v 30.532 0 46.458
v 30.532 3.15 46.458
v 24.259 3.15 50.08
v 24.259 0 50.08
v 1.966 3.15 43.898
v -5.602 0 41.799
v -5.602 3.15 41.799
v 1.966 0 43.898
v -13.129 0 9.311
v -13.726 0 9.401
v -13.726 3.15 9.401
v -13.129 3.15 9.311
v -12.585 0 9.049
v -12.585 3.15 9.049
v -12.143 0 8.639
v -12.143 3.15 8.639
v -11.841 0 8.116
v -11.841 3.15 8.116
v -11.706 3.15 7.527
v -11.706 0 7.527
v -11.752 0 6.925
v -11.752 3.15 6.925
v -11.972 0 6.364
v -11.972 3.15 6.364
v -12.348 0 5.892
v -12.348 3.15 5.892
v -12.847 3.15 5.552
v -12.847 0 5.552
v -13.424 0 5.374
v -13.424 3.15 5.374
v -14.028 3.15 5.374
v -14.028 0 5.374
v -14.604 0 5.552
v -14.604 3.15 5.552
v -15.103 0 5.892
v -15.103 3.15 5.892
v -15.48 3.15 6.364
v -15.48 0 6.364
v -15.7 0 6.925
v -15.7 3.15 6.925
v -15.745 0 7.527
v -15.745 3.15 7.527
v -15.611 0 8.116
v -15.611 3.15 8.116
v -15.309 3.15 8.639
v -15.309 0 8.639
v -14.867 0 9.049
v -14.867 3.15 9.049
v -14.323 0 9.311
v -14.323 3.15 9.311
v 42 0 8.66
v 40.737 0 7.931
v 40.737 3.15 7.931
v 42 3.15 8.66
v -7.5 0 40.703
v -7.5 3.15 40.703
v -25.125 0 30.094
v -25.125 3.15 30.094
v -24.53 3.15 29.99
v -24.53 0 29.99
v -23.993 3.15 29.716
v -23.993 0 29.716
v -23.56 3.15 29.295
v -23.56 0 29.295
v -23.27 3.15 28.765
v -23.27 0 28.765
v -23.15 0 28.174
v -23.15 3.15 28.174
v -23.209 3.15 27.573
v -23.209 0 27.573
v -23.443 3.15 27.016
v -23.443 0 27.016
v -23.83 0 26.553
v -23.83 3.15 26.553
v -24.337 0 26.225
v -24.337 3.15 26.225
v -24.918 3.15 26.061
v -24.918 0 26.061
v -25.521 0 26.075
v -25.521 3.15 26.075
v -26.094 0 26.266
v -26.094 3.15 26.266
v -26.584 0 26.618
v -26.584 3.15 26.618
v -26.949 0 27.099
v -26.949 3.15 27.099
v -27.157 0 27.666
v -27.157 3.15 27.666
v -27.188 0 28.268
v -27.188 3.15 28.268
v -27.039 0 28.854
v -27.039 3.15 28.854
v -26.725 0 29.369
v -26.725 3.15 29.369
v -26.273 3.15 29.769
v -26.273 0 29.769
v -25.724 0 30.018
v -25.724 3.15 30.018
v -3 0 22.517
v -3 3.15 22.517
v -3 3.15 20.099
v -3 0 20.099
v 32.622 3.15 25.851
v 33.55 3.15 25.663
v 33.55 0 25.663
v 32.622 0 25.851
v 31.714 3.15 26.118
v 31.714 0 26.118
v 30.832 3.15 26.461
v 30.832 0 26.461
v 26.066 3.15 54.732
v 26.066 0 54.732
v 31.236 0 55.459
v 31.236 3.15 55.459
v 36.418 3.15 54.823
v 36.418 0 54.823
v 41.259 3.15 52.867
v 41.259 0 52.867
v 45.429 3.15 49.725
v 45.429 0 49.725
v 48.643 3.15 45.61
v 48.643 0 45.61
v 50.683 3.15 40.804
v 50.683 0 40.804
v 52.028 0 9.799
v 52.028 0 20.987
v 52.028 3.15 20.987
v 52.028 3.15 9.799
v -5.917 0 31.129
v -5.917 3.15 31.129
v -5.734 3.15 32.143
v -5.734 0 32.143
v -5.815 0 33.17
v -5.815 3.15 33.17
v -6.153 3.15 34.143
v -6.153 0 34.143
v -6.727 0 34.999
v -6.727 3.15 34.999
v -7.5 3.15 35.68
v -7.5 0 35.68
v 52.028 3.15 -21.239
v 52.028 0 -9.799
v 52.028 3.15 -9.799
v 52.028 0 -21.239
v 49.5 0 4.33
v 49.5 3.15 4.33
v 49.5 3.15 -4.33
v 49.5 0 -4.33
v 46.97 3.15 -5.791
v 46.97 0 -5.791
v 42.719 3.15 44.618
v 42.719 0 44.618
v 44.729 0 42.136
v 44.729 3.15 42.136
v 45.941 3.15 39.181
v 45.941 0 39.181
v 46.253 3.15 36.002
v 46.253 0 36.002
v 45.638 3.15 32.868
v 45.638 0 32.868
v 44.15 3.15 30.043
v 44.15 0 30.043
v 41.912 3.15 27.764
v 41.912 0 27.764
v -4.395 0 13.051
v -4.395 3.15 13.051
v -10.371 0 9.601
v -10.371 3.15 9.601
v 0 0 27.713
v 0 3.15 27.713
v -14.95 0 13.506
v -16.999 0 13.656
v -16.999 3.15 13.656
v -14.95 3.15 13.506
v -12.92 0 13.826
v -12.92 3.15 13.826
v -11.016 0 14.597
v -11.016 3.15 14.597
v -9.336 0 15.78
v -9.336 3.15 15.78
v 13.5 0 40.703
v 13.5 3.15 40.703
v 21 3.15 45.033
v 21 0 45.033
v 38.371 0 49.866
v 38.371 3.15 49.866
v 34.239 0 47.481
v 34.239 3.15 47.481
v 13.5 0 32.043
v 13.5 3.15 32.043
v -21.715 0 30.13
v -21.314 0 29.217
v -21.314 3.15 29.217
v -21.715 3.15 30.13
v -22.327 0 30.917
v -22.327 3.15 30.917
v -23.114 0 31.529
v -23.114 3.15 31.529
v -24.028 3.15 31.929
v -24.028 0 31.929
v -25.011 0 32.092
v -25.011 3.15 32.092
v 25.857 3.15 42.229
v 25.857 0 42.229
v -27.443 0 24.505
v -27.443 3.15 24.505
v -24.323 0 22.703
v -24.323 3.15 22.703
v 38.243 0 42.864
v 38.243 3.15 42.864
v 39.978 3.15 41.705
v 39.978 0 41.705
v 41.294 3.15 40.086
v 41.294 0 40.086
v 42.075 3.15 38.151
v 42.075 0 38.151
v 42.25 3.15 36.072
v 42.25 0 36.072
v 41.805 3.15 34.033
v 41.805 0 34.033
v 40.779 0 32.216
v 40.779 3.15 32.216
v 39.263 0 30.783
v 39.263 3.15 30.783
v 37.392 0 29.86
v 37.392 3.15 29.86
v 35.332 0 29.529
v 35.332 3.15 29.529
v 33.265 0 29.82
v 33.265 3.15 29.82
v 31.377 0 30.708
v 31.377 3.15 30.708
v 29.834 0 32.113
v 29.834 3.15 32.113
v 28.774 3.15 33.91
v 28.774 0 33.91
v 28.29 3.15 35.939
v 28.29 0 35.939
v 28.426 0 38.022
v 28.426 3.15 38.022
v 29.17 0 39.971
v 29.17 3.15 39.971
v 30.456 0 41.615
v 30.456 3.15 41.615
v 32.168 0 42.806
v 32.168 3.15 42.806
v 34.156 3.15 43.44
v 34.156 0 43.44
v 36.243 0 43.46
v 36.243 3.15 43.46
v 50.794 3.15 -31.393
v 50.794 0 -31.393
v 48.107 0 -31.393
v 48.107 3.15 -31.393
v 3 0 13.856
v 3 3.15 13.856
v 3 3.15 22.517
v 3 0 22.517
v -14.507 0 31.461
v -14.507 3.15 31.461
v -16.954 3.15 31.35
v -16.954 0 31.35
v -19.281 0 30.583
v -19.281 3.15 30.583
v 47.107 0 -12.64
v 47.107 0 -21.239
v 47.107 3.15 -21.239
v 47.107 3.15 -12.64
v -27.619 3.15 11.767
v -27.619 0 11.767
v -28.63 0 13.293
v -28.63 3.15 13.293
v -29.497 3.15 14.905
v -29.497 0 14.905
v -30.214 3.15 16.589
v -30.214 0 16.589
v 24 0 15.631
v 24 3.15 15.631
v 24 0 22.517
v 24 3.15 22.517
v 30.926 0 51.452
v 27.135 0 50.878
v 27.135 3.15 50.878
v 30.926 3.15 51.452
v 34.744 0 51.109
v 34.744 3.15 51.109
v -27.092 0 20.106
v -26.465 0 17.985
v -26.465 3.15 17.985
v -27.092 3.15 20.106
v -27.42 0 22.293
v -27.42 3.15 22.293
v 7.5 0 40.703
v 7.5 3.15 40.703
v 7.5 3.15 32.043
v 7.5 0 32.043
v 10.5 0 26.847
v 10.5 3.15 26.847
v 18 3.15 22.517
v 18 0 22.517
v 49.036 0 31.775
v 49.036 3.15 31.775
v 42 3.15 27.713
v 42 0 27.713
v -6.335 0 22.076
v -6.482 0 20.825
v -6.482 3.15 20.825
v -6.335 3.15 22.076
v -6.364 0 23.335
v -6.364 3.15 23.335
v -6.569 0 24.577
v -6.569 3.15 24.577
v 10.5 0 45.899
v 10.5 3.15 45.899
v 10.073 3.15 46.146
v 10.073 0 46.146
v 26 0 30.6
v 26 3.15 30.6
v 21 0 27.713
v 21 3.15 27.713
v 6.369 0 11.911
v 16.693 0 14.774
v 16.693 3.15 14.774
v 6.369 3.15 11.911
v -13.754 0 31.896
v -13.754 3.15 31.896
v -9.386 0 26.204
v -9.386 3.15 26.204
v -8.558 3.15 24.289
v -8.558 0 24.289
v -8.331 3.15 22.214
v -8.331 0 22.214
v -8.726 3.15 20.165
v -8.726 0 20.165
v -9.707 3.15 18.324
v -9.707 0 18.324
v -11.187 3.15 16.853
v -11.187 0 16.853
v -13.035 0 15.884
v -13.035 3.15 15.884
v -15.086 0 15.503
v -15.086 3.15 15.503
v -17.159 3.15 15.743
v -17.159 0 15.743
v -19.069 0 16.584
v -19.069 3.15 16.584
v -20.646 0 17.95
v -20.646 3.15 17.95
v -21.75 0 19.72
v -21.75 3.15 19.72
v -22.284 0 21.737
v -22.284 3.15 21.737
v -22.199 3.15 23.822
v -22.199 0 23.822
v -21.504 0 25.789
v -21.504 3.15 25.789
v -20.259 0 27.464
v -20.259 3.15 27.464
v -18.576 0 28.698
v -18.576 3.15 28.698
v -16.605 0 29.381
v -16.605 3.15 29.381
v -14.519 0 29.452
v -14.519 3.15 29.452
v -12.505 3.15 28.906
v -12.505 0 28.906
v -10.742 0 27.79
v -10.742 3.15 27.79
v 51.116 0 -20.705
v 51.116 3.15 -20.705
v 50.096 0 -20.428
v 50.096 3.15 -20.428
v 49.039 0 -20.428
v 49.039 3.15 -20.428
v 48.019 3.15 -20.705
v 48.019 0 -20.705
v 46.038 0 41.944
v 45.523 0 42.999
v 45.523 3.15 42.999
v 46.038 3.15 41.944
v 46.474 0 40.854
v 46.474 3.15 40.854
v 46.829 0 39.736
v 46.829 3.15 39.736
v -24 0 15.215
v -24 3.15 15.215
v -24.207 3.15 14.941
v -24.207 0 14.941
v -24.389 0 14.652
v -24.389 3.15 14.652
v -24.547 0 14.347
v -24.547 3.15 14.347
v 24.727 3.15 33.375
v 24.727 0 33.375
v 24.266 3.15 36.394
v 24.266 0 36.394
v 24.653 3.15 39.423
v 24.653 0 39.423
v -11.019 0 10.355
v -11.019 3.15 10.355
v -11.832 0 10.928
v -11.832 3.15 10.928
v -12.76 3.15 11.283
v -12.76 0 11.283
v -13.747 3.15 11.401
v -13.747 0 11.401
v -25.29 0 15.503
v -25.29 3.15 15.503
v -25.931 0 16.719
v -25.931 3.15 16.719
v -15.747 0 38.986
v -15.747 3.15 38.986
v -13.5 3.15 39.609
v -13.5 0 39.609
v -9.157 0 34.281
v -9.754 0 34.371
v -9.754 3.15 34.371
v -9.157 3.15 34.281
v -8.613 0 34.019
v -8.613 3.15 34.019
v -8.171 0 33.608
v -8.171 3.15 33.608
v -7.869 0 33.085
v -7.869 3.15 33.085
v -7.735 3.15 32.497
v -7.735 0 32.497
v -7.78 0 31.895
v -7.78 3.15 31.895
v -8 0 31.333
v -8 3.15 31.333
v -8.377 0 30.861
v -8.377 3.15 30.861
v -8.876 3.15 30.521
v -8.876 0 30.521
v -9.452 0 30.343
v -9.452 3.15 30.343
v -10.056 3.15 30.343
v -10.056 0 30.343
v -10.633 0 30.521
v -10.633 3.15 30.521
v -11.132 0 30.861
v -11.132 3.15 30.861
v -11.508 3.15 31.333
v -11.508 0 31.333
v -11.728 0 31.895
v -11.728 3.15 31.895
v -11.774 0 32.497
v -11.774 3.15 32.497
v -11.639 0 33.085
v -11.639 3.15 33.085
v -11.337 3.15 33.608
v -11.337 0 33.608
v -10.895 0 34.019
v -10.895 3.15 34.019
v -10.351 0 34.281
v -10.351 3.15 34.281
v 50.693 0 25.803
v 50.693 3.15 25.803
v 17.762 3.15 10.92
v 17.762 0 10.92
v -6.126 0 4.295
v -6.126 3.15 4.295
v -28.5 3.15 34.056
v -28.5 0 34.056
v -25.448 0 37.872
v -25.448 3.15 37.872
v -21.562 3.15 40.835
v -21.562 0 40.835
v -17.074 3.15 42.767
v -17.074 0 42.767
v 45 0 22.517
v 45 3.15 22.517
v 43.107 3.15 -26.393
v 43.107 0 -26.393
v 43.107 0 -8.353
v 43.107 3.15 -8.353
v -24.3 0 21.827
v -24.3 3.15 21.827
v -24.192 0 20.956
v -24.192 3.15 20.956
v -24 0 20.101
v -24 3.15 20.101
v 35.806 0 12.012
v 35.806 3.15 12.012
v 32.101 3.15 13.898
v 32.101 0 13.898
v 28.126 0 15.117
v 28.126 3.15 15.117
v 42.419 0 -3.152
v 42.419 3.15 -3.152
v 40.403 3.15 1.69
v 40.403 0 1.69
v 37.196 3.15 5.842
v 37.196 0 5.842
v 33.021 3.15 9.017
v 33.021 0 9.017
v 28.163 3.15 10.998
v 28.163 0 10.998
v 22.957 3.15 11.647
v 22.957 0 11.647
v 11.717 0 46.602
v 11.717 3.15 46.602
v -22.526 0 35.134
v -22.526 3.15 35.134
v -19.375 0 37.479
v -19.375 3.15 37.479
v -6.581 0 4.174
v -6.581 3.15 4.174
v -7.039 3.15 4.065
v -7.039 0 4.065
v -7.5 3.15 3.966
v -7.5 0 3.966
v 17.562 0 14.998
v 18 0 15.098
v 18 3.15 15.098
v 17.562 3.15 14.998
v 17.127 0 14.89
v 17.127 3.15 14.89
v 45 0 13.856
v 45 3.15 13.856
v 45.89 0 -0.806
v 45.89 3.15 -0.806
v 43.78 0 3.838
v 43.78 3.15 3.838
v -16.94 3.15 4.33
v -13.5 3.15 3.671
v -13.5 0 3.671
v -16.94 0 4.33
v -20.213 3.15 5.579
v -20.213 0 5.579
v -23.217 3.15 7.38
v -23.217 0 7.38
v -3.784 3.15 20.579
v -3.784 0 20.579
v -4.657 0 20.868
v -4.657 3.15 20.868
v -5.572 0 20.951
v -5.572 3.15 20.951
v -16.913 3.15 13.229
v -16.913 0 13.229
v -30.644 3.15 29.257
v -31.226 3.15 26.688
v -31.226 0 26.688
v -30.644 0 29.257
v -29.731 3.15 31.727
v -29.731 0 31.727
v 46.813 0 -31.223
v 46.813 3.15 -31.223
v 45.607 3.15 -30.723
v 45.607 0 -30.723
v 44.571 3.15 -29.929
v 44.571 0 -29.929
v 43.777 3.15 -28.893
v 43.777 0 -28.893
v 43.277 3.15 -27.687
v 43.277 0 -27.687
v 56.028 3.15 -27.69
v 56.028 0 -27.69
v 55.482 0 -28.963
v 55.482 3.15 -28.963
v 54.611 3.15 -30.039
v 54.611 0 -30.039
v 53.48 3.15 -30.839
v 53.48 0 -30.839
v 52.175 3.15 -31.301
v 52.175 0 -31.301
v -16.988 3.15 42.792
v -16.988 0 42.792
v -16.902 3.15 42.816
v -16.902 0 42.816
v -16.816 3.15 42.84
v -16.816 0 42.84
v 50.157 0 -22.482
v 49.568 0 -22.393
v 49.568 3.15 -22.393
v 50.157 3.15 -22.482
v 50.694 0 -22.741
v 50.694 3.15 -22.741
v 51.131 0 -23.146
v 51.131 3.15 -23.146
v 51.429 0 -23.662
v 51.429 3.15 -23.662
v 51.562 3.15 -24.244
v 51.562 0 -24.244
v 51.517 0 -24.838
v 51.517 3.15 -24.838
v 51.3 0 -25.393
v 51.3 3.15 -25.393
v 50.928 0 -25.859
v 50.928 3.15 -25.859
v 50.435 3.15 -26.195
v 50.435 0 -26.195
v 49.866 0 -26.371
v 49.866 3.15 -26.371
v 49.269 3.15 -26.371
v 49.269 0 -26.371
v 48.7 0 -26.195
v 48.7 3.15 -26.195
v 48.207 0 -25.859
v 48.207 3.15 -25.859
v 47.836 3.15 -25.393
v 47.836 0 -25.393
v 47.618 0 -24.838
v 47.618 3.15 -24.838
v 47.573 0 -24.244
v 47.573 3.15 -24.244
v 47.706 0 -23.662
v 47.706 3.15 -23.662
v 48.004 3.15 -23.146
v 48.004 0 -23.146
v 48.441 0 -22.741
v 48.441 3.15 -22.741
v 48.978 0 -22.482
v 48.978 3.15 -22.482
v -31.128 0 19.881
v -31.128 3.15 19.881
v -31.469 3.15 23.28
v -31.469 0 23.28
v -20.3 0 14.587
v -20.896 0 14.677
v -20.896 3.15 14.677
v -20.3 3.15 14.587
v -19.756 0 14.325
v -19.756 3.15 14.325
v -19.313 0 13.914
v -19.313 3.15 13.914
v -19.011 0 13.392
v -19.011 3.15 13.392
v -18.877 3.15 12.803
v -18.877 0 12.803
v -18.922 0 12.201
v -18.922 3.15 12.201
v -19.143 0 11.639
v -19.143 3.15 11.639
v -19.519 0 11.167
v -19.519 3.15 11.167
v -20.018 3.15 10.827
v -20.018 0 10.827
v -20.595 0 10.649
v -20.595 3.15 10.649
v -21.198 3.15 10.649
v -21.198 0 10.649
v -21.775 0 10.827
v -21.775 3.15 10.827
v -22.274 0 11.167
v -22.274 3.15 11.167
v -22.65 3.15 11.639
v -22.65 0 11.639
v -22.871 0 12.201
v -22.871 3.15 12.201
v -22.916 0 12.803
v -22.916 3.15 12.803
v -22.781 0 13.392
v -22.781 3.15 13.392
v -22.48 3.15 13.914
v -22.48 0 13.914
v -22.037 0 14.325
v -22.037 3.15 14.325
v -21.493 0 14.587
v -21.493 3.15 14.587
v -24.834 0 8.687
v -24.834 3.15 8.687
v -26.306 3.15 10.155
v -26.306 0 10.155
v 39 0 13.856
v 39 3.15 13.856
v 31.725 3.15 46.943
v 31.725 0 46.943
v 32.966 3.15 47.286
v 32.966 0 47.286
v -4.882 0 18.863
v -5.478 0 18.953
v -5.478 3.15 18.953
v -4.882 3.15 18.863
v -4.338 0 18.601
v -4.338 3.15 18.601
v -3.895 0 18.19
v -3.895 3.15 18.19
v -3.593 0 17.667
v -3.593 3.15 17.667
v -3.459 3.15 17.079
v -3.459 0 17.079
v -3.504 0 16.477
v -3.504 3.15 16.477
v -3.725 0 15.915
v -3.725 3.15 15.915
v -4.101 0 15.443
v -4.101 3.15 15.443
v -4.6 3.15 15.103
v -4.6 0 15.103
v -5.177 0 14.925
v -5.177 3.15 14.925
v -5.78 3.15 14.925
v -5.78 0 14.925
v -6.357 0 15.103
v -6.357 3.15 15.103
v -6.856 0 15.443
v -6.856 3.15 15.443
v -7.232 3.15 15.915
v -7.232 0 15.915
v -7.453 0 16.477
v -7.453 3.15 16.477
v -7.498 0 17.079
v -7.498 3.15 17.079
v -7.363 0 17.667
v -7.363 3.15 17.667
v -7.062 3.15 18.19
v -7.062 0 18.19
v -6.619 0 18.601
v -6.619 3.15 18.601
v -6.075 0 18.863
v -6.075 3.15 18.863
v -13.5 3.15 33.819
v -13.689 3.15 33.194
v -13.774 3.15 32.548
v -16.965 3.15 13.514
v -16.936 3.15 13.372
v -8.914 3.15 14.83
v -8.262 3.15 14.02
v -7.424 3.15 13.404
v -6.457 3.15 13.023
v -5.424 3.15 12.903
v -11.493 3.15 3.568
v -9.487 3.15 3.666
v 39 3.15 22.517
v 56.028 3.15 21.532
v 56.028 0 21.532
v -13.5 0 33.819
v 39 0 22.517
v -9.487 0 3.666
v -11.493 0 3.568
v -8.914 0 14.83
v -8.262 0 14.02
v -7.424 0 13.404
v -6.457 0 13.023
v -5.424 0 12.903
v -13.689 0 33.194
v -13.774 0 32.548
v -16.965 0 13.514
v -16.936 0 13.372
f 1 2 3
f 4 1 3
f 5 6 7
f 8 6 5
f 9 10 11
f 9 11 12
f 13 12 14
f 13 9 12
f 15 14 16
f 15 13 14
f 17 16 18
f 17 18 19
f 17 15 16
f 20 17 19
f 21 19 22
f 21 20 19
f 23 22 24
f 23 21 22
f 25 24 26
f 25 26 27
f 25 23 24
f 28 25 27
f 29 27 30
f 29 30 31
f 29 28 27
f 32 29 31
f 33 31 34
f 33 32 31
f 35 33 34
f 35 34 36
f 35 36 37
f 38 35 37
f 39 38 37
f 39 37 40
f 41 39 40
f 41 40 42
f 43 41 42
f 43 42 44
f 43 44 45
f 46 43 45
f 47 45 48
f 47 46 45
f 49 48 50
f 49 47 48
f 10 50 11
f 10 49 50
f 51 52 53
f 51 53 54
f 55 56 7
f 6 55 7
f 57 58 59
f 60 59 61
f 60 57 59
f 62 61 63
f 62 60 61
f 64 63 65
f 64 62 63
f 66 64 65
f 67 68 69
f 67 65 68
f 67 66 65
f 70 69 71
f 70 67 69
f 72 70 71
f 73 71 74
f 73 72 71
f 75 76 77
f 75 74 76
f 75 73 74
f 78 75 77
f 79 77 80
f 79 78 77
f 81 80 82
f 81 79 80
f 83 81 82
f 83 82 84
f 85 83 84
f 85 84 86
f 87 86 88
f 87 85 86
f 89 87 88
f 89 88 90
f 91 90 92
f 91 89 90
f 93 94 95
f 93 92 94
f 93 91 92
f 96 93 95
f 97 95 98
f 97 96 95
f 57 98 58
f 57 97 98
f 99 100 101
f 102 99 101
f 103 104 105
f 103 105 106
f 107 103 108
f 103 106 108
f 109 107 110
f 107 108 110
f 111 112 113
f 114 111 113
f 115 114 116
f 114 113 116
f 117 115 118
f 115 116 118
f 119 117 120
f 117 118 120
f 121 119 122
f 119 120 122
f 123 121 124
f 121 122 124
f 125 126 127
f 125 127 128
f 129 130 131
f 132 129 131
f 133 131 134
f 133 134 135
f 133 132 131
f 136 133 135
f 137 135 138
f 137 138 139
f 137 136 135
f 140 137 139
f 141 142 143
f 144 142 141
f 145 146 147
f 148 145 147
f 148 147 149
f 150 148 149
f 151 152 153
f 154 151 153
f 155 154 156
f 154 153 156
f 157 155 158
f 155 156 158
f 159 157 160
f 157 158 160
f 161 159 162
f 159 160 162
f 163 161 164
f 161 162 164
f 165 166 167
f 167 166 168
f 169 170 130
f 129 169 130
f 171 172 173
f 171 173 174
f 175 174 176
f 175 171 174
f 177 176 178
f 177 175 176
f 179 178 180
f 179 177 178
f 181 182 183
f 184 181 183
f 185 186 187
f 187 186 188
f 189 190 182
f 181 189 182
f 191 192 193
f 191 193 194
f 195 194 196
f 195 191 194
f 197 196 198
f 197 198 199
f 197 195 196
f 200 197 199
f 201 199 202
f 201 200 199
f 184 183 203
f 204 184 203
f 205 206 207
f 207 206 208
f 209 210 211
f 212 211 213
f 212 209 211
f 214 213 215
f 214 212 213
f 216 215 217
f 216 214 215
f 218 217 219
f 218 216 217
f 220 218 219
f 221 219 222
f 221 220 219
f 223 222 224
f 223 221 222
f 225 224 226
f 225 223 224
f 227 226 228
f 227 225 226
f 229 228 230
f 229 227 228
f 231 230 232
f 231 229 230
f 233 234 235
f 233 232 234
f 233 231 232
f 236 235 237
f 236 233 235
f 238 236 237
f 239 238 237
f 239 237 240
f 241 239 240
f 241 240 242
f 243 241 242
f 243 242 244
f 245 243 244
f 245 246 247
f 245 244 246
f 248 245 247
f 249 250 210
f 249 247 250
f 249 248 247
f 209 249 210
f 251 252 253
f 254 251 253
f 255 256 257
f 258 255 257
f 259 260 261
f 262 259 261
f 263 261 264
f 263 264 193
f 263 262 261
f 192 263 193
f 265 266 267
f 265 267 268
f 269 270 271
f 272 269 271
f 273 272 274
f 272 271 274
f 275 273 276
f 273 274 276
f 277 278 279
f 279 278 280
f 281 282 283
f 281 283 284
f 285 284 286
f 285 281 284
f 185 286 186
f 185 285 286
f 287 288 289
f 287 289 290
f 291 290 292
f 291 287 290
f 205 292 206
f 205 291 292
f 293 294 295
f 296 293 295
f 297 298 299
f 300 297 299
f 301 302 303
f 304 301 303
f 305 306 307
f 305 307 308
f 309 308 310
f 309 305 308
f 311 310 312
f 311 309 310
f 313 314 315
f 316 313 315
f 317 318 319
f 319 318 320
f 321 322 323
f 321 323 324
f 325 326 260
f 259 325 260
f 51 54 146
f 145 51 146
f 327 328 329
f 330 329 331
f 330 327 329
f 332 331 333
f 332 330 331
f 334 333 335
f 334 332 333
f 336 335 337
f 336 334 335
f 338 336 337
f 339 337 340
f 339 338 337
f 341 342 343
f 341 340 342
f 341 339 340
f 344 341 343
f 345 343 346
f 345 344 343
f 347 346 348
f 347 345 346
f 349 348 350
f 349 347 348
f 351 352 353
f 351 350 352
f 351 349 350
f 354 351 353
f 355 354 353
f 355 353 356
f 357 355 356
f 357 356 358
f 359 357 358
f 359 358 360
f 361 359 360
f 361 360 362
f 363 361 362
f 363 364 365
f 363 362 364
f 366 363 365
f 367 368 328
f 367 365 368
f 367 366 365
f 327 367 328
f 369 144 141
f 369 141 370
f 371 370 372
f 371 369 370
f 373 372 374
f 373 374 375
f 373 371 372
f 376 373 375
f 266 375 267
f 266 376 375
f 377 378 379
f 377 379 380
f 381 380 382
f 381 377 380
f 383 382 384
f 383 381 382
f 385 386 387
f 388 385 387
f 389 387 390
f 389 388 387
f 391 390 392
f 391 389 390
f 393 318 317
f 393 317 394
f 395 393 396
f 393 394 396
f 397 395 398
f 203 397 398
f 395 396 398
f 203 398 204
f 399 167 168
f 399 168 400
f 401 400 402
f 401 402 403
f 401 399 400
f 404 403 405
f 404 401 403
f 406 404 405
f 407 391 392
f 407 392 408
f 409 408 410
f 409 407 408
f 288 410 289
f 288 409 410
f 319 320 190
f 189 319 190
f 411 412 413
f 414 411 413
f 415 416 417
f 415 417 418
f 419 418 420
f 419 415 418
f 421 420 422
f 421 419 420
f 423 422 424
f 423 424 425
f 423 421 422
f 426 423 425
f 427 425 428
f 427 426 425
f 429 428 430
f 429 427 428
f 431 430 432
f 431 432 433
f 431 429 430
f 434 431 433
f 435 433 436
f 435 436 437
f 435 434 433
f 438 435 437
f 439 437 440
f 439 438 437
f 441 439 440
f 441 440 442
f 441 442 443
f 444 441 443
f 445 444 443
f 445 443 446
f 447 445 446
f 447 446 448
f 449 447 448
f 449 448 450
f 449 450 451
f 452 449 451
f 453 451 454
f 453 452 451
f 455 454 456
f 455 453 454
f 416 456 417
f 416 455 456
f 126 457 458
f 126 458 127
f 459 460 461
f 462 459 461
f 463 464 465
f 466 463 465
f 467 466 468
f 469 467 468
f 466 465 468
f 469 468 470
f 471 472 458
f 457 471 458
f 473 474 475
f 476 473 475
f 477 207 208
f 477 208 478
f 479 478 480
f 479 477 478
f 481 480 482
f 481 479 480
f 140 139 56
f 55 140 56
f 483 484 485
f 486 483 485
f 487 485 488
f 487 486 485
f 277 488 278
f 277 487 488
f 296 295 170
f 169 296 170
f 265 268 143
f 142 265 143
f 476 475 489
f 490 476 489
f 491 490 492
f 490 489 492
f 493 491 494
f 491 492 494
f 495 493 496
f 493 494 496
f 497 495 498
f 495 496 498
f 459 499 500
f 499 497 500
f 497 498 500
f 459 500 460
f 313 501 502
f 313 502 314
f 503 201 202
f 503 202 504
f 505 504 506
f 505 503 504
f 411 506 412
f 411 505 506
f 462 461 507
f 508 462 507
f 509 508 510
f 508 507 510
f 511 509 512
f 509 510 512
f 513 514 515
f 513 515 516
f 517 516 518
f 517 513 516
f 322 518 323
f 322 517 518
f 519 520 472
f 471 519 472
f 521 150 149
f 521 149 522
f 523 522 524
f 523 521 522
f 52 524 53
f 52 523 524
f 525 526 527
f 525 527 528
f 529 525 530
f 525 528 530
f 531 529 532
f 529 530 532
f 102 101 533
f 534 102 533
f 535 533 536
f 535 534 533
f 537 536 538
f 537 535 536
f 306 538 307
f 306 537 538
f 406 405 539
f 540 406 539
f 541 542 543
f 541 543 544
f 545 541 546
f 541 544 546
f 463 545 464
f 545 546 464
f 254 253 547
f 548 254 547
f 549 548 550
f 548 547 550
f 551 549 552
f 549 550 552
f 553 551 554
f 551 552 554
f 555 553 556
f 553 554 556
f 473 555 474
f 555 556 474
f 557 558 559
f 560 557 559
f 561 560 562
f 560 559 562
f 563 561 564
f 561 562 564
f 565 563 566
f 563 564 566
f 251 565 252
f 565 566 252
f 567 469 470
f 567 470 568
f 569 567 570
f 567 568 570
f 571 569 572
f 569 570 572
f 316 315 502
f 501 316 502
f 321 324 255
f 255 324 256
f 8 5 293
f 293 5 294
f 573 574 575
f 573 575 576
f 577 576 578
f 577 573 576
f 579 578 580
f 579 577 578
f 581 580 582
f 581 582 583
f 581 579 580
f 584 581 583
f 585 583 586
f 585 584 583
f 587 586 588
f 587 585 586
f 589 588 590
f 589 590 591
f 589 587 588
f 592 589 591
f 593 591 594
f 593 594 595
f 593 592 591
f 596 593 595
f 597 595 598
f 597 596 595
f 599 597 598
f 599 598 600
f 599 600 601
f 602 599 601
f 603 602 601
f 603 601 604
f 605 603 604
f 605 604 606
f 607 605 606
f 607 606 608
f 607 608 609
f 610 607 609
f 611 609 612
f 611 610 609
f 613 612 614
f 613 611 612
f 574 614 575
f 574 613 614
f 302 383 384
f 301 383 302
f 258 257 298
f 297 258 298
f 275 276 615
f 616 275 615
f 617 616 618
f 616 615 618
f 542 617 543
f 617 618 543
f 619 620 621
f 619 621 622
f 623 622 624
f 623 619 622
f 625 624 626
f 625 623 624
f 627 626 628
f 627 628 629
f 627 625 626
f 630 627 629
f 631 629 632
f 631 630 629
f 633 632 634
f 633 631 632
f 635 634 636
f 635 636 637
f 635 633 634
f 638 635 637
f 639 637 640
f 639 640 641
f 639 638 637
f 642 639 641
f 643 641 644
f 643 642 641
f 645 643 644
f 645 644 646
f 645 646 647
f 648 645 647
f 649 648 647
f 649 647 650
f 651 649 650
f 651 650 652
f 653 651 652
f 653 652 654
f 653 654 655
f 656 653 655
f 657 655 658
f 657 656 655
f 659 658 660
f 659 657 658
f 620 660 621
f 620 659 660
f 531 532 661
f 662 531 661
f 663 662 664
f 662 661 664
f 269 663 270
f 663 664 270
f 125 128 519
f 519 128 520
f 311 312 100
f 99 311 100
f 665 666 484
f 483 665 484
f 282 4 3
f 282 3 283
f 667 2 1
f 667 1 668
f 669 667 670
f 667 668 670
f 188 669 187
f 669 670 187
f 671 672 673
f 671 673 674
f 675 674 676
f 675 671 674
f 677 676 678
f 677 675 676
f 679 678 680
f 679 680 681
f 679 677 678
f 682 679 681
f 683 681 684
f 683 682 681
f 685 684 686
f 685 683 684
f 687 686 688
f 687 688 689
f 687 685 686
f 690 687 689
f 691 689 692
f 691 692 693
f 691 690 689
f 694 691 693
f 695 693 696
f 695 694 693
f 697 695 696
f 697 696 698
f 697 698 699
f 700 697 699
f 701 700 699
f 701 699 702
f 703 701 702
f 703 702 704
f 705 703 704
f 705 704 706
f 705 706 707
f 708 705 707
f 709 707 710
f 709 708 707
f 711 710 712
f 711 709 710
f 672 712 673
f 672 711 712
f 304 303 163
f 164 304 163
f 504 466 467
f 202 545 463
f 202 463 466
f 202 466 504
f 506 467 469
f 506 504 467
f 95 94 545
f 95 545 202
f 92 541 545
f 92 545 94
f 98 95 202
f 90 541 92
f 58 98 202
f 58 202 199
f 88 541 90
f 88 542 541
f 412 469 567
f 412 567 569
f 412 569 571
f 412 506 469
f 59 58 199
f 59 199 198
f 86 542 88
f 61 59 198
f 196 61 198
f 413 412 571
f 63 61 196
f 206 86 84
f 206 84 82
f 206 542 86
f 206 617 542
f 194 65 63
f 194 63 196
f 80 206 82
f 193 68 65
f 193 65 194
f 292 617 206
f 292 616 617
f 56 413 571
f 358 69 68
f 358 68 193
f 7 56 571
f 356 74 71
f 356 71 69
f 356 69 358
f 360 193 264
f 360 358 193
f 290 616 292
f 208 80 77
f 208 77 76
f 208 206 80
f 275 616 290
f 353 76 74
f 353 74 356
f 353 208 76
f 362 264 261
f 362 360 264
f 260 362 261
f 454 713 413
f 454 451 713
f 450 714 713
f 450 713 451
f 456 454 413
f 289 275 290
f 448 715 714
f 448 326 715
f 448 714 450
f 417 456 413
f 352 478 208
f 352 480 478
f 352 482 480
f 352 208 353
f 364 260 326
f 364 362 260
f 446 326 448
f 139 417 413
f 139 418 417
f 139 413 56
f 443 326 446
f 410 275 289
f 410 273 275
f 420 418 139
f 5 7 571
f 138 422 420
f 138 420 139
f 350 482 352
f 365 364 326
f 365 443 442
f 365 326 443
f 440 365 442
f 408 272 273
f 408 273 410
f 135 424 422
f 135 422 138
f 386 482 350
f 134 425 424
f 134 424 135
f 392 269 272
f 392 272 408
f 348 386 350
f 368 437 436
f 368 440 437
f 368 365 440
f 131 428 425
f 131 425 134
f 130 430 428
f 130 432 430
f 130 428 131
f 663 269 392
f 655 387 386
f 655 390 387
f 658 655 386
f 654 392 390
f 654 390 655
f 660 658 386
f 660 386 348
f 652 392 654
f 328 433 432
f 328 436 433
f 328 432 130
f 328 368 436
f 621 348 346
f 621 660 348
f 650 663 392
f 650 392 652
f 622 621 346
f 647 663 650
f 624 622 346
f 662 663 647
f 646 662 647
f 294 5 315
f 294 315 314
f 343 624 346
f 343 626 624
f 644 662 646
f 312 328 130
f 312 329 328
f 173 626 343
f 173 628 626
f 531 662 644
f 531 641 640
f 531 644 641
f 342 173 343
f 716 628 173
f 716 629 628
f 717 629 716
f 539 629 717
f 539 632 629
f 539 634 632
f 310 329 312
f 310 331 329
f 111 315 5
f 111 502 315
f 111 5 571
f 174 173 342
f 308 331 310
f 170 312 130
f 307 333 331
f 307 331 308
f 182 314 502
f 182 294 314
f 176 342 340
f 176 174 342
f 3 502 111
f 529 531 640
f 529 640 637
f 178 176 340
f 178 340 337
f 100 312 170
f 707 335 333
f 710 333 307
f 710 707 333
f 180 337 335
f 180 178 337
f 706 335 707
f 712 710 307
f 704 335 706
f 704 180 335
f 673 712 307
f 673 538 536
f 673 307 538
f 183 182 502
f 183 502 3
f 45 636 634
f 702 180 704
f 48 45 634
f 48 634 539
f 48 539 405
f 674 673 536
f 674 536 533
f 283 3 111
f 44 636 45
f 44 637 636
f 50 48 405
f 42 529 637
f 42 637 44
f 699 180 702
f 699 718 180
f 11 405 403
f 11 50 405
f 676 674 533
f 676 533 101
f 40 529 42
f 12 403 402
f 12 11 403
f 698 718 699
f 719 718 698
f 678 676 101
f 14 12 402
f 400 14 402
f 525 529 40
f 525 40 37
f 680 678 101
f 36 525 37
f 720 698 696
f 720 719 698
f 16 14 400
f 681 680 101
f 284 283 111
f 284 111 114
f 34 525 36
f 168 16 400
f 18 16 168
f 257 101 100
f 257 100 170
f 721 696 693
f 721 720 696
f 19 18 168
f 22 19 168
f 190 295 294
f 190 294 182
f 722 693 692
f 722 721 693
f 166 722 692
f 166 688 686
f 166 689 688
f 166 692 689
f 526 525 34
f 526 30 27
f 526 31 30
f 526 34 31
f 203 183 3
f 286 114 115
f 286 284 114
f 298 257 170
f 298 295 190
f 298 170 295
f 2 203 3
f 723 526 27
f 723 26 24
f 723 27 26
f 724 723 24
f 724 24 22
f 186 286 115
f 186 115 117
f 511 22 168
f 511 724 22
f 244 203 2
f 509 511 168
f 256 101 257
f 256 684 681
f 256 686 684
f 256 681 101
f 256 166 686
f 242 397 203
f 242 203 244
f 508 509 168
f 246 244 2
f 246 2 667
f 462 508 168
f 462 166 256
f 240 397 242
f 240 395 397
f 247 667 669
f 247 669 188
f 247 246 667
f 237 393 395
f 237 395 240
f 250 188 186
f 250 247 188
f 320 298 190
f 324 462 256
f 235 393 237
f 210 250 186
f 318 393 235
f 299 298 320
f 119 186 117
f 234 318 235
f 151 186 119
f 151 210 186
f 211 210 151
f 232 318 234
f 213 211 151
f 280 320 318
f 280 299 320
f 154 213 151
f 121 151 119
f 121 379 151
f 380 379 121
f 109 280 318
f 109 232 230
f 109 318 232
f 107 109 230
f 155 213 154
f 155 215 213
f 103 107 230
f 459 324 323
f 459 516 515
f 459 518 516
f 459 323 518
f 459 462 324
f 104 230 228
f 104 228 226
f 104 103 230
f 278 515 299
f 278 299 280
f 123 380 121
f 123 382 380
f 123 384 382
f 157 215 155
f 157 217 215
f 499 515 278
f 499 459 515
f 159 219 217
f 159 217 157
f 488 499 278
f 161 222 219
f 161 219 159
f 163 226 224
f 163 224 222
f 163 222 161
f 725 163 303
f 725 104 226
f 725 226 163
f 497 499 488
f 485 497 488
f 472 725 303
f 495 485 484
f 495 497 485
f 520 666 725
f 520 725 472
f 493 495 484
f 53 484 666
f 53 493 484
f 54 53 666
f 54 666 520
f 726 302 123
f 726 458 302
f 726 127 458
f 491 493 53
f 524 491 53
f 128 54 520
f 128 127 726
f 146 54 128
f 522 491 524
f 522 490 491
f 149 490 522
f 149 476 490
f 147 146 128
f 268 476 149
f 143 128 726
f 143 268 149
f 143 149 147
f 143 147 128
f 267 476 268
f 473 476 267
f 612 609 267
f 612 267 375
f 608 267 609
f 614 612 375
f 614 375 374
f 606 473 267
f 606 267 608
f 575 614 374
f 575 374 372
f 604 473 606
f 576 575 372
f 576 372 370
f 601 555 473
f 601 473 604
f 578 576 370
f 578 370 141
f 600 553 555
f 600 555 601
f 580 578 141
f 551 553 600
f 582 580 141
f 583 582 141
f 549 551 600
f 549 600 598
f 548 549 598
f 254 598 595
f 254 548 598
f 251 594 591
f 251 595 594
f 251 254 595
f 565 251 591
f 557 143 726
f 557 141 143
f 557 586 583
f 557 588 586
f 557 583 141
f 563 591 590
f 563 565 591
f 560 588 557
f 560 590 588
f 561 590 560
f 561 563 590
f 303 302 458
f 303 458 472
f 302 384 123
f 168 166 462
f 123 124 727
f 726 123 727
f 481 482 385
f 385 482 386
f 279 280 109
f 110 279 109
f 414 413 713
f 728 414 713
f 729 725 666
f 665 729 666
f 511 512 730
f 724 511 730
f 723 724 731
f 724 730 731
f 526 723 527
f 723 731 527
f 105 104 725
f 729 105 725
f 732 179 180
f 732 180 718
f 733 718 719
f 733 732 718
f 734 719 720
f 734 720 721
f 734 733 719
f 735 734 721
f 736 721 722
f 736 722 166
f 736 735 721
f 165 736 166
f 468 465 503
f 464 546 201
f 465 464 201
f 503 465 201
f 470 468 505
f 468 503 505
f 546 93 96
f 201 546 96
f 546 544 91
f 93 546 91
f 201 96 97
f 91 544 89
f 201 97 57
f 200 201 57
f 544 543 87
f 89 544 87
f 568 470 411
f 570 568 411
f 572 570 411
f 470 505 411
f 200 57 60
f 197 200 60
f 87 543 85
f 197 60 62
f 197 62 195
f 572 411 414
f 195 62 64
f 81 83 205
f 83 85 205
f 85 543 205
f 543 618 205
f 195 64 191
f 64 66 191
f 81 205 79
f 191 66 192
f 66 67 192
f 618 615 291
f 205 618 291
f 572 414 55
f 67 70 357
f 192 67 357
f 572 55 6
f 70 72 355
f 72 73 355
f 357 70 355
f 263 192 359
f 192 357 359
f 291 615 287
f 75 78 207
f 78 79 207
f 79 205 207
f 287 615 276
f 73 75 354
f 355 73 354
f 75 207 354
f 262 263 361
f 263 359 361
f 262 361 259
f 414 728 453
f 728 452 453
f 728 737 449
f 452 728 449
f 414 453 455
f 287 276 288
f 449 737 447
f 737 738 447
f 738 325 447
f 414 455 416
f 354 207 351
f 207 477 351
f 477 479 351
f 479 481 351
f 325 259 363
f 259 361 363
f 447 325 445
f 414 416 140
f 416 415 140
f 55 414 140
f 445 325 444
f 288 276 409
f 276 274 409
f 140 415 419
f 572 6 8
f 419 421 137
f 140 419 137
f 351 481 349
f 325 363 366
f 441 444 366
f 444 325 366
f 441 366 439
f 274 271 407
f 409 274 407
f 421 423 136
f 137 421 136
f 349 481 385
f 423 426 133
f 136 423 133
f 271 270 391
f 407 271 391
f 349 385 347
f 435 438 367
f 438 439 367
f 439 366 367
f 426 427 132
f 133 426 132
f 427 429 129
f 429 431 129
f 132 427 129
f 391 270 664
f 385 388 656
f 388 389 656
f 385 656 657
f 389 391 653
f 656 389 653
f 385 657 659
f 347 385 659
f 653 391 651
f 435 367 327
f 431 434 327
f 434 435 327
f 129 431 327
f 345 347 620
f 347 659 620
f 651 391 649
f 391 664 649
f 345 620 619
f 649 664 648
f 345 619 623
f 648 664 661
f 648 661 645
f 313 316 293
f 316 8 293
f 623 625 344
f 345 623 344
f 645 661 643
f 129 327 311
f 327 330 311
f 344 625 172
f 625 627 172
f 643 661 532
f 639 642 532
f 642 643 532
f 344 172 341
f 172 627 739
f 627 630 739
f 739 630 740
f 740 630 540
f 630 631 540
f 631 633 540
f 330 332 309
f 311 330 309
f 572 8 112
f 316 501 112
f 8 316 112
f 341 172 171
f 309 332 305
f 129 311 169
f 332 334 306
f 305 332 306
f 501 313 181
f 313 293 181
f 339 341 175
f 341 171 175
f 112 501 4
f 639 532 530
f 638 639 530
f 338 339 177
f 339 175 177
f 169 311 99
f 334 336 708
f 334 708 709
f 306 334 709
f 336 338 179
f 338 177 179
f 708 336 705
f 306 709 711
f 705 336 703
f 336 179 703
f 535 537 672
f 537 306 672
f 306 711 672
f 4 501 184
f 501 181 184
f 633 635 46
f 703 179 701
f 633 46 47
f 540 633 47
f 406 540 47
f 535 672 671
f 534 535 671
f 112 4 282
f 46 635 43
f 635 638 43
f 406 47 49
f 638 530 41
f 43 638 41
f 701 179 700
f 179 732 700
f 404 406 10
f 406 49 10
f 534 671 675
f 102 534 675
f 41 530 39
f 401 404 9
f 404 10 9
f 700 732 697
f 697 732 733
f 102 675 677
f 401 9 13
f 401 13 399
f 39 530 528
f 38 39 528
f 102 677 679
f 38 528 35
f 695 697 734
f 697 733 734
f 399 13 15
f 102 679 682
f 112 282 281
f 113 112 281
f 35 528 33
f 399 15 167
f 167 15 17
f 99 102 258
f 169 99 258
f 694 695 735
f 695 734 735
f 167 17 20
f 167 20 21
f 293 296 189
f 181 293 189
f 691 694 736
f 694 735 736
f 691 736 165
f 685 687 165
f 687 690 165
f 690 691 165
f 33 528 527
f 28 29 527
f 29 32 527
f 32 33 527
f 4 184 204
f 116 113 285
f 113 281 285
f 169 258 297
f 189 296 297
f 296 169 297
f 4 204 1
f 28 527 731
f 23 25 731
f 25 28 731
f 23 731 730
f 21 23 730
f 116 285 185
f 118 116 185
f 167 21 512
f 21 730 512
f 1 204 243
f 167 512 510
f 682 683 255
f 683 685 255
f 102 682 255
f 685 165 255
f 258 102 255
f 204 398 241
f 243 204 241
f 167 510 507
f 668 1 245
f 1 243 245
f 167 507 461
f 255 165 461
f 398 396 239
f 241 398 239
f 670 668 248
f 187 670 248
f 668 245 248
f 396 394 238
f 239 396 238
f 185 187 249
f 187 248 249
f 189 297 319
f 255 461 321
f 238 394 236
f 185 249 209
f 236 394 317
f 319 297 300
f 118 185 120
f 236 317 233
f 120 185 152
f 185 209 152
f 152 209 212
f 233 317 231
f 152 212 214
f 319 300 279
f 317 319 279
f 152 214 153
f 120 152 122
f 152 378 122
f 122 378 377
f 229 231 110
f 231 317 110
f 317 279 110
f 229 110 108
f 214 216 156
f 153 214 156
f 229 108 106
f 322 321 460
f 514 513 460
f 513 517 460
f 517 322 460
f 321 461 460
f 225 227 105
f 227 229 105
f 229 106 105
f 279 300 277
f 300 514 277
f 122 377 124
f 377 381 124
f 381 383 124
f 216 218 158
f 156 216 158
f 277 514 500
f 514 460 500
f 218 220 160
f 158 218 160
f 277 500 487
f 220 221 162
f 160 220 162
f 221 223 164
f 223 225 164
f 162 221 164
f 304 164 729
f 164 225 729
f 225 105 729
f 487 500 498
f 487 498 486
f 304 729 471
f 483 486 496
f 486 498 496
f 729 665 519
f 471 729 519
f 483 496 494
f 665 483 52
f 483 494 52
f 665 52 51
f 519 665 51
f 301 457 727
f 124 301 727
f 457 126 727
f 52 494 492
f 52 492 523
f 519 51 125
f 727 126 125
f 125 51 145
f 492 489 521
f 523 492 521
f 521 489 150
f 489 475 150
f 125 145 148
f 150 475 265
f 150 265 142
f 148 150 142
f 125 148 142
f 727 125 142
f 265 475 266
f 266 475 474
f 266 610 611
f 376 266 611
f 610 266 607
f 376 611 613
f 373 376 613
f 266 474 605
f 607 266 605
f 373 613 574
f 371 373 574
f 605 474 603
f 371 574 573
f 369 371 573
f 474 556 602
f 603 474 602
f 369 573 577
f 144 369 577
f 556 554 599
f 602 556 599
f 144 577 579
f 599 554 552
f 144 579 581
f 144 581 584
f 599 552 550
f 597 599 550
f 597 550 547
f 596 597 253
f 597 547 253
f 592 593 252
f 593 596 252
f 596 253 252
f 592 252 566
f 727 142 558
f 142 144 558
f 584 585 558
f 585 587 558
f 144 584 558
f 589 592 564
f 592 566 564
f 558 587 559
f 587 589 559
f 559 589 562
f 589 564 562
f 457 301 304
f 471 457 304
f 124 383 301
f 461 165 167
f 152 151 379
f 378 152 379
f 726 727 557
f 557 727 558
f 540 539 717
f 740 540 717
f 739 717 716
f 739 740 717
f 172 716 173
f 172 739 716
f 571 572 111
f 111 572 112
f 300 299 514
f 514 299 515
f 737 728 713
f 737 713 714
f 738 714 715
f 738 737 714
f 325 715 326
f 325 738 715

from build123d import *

# Parameters (mm, degrees)
SKETCH1_R           = 7
SKETCH1_R_2         = 2.025
SKETCH1_R_3         = 2.05
BOSS_EXTRUDE1_DEPTH = 3.15
CUT_EXTRUDE1_DEPTH  = 3.15
BOSS_EXTRUDE2_START = -3.15
SKETCH3_R           = 2
SKETCH3_R_2         = 7
SKETCH3_R_3         = 2.025
SKETCH3_R_4         = 11
BOSS_EXTRUDE2_DEPTH = 3.15


with BuildPart() as part:
    # Sketch1 → Boss-Extrude1 (new body)
    with BuildSketch(Plane(origin=(0, 0, 0), x_dir=(1, 0, 0), z_dir=(0, 1, 0))):
        with BuildLine():
            Line((51.028117024, 31.392984288), (48.107015586, 31.392984288))
            ThreePointArc((48.107015586, 31.392984288), (44.57148168, 29.928518194), (43.107015586, 26.392984288))
            Line((43.107015586, 26.392984288), (43.107015586, 8.3528051))
            ThreePointArc((43.107015586, 8.3528051), (35.212895347, -7.567234951), (17.762248065, -10.919803965))
            Line((17.762248065, -10.919803965), (-6.126047208, -4.29499337))
            ThreePointArc((-6.126047208, -4.29499337), (-21.319285931, -6.160488515), (-30.743423793, -18.222834912))
            ThreePointArc((-30.743423793, -18.222834912), (-28.877928648, -33.416073636), (-16.815582251, -42.840211498))
            Line((-16.815582251, -42.840211498), (26.065972917, -54.732319234))
            ThreePointArc((26.065972917, -54.732319234), (41.259211641, -52.866824088), (50.683349503, -40.804477691))
            Line((50.683349503, -40.804477691), (56.028117024, -21.531868627))
            Line((56.028117024, -21.531868627), (56.028117024, 26.392984288))
            ThreePointArc((56.028117024, 26.392984288), (54.56365093, 29.928518194), (51.028117024, 31.392984288))
        make_face()
        with Locations(Location((35.265262251, -36.528663674, 0), (0, 0, 270))):
            Circle(SKETCH1_R, mode=Mode.SUBTRACT)
        with Locations(Location((-15.325336542, -22.49864893, 0), (0, 0, 270))):
            Circle(SKETCH1_R, mode=Mode.SUBTRACT)
        with Locations(Location((-5.478385908, -16.927512313, 0), (0, 0, 270))):
            Circle(SKETCH1_R_2, mode=Mode.SUBTRACT)
        with Locations(Location((-9.754199925, -32.345599564, 0), (0, 0, 270))):
            Circle(SKETCH1_R_2, mode=Mode.SUBTRACT)
        with Locations(Location((-25.172287176, -28.069785547, 0), (0, 0, 270))):
            Circle(SKETCH1_R_2, mode=Mode.SUBTRACT)
        with Locations(Location((-20.896473159, -12.651698295, 0), (0, 0, 270))):
            Circle(SKETCH1_R_2, mode=Mode.SUBTRACT)
        with Locations(Location((-13.725837034, -7.376096191, 0), (0, 0, 270))):
            Circle(SKETCH1_R_2, mode=Mode.SUBTRACT)
        with Locations(Location((49.567566305, 24.392984288, 0), (0, 0, 270))):
            Circle(SKETCH1_R_3, mode=Mode.SUBTRACT)
    extrude(amount=BOSS_EXTRUDE1_DEPTH)

    # Sketch2 → Cut-Extrude1 (cut)
    with BuildSketch(Plane(origin=(0, 3.15, 0), x_dir=(1, 0, 0), z_dir=(0, 1, 0))):
        Polygon((0, 8.660254038), (-7.5, 4.330127019), (-7.5, -4.330127019), (0, -8.660254038), (7.5, -4.330127019), (7.5, 4.330127019), align=None)
        Polygon((21, 8.660254038), (13.5, 4.330127019), (13.5, -4.330127019), (21, -8.660254038), (28.5, -4.330127019), (28.5, 4.330127019), align=None)
        Polygon((10.5, -9.526279442), (3, -13.856406461), (3, -22.516660498), (10.5, -26.846787517), (18, -22.516660498), (18, -13.856406461), align=None)
        Polygon((31.5, -9.526279442), (24, -13.856406461), (24, -22.516660498), (31.5, -26.846787517), (39, -22.516660498), (39, -13.856406461), align=None)
        Polygon((52.5, -9.526279442), (45, -13.856406461), (45, -22.516660498), (52.5, -26.846787517), (60, -22.516660498), (60, -13.856406461), align=None)
        Polygon((42, 8.660254038), (34.5, 4.330127019), (34.5, -4.330127019), (42, -8.660254038), (49.5, -4.330127019), (49.5, 4.330127019), align=None)
        Polygon((63, 8.660254038), (55.5, 4.330127019), (55.5, -4.330127019), (63, -8.660254038), (70.5, -4.330127019), (70.5, 4.330127019), align=None)
        Polygon((73.5, -9.526279442), (66, -13.856406461), (66, -22.516660498), (73.5, -26.846787517), (81, -22.516660498), (81, -13.856406461), align=None)
        Polygon((52.5, -45.899346401), (45, -50.229473419), (45, -58.889727457), (52.5, -63.219854476), (60, -58.889727457), (60, -50.229473419), align=None)
        Polygon((42, -27.712812921), (34.5, -32.04293994), (34.5, -40.703193978), (42, -45.033320997), (49.5, -40.703193978), (49.5, -32.04293994), align=None)
        Polygon((63, -27.712812921), (55.5, -32.04293994), (55.5, -40.703193978), (63, -45.033320997), (70.5, -40.703193978), (70.5, -32.04293994), align=None)
        Polygon((73.5, -45.899346401), (66, -50.229473419), (66, -58.889727457), (73.5, -63.219854476), (81, -58.889727457), (81, -50.229473419), align=None)
        Polygon((10.5, -45.899346401), (3, -50.229473419), (3, -58.889727457), (10.5, -63.219854476), (18, -58.889727457), (18, -50.229473419), align=None)
        Polygon((0, -27.712812921), (-7.5, -32.04293994), (-7.5, -40.703193978), (0, -45.033320997), (7.5, -40.703193978), (7.5, -32.04293994), align=None)
        Polygon((21, -27.712812921), (13.5, -32.04293994), (13.5, -40.703193978), (21, -45.033320997), (28.5, -40.703193978), (28.5, -32.04293994), align=None)
        Polygon((31.5, -45.899346401), (24, -50.229473419), (24, -58.889727457), (31.5, -63.219854476), (39, -58.889727457), (39, -50.229473419), align=None)
        Polygon((-21, -27.712812921), (-28.5, -32.04293994), (-28.5, -40.703193978), (-21, -45.033320997), (-13.5, -40.703193978), (-13.5, -32.04293994), align=None)
        Polygon((-10.5, -9.526279442), (-18, -13.856406461), (-18, -22.516660498), (-10.5, -26.846787517), (-3, -22.516660498), (-3, -13.856406461), align=None)
        Polygon((-21, 8.660254038), (-28.5, 4.330127019), (-28.5, -4.330127019), (-21, -8.660254038), (-13.5, -4.330127019), (-13.5, 4.330127019), align=None)
        Polygon((-10.5, -45.899346401), (-18, -50.229473419), (-18, -58.889727457), (-10.5, -63.219854476), (-3, -58.889727457), (-3, -50.229473419), align=None)
        Polygon((-42, -27.712812921), (-49.5, -32.04293994), (-49.5, -40.703193978), (-42, -45.033320997), (-34.5, -40.703193978), (-34.5, -32.04293994), align=None)
        Polygon((-31.5, -9.526279442), (-39, -13.856406461), (-39, -22.516660498), (-31.5, -26.846787517), (-24, -22.516660498), (-24, -13.856406461), align=None)
        Polygon((-42, 8.660254038), (-49.5, 4.330127019), (-49.5, -4.330127019), (-42, -8.660254038), (-34.5, -4.330127019), (-34.5, 4.330127019), align=None)
        Polygon((-31.5, -45.899346401), (-39, -50.229473419), (-39, -58.889727457), (-31.5, -63.219854476), (-24, -58.889727457), (-24, -50.229473419), align=None)
        Polygon((42, 45.033320997), (34.5, 40.703193978), (34.5, 32.04293994), (42, 27.712812921), (49.5, 32.04293994), (49.5, 40.703193978), align=None)
        Polygon((63, 45.033320997), (55.5, 40.703193978), (55.5, 32.04293994), (63, 27.712812921), (70.5, 32.04293994), (70.5, 40.703193978), align=None)
        Polygon((73.5, 26.846787517), (66, 22.516660498), (66, 13.856406461), (73.5, 9.526279442), (81, 13.856406461), (81, 22.516660498), align=None)
        Polygon((52.5, 26.846787517), (45, 22.516660498), (45, 13.856406461), (52.5, 9.526279442), (60, 13.856406461), (60, 22.516660498), align=None)
    extrude(amount=-CUT_EXTRUDE1_DEPTH, mode=Mode.SUBTRACT)

    # Sketch3 → Boss-Extrude2 (add)
    # profile 1 of 2: a face of its own
    with BuildSketch(Plane(origin=(0, 3.15, 0), x_dir=(1, 0, 0), z_dir=(0, 1, 0)).offset(BOSS_EXTRUDE2_START)):
        with BuildLine():
            Line((50.793806272, 31.392984288), (48.107015586, 31.392984288))
            ThreePointArc((48.107015586, 31.392984288), (44.57148168, 29.928518194), (43.107015586, 26.392984288))
            Line((43.107015586, 26.392984288), (43.107015586, 8.3528051))
            ThreePointArc((43.107015586, 8.3528051), (35.212895347, -7.567234951), (17.762248065, -10.919803965))
            Line((17.762248065, -10.919803965), (-6.126047208, -4.29499337))
            ThreePointArc((-6.126047208, -4.29499337), (-20.562647206, -5.753602821), (-30.213693877, -16.588742838))
            ThreePointArc((-30.213693877, -16.588742838), (-29.284814342, -32.659434911), (-16.815582251, -42.840211498))
            Line((-16.815582251, -42.840211498), (26.065972917, -54.732319234))
            ThreePointArc((26.065972917, -54.732319234), (41.259211641, -52.866824088), (50.683349503, -40.804477691))
            Line((50.683349503, -40.804477691), (56.028117024, -21.531868627))
            Line((56.028117024, -21.531868627), (56.028117024, 27.690214825))
            ThreePointArc((56.028117024, 27.690214825), (54.073099239, 30.477610817), (50.793806272, 31.392984288))
        make_face()
        with Locations(Location((49.567566305, 24.392984288, 0), (0, 0, 270))):
            Circle(SKETCH3_R, mode=Mode.SUBTRACT)
        with Locations(Location((-15.325336542, -22.49864893, 0), (0, 0, 270))):
            Circle(SKETCH3_R_2, mode=Mode.SUBTRACT)
        with Locations(Location((-20.896473159, -12.651698295, 0), (0, 0, 270))):
            Circle(SKETCH3_R_3, mode=Mode.SUBTRACT)
        with Locations(Location((-13.725837034, -7.376096191, 0), (0, 0, 270))):
            Circle(SKETCH3_R_3, mode=Mode.SUBTRACT)
        with Locations(Location((-25.172287176, -28.069785547, 0), (0, 0, 270))):
            Circle(SKETCH3_R_3, mode=Mode.SUBTRACT)
        with Locations(Location((-9.754199925, -32.345599564, 0), (0, 0, 270))):
            Circle(SKETCH3_R_3, mode=Mode.SUBTRACT)
        with Locations(Location((-5.478385908, -16.927512313, 0), (0, 0, 270))):
            Circle(SKETCH3_R_3, mode=Mode.SUBTRACT)
        with BuildLine():
            Line((47.107015586, 21.239305458), (47.107015586, 8.3528051))
            ThreePointArc((47.107015586, 8.3528051), (37.634071299, -10.751242961), (16.69329456, -14.774325777))
            Line((16.69329456, -14.774325777), (-7.195000712, -8.149515183))
            ThreePointArc((-7.195000712, -8.149515183), (-8.443375133, -7.856631443), (-9.711193989, -7.66465507))
            ThreePointArc((-9.711193989, -7.66465507), (-13.17062628, -11.36261924), (-17.508855114, -8.750650375))
            ThreePointArc((-17.508855114, -8.750650375), (-18.103373072, -9.007067766), (-18.687030177, -9.287328115))
            ThreePointArc((-18.687030177, -9.287328115), (-17.142141715, -11.200622691), (-16.998671761, -13.655575412))
            ThreePointArc((-16.998671761, -13.655575412), (-12.920191157, -13.825974851), (-9.336488748, -15.780486823))
            ThreePointArc((-9.336488748, -15.780486823), (-1.975204232, -14.945507483), (-6.482263024, -20.82531371))
            ThreePointArc((-6.482263024, -20.82531371), (-6.652662463, -24.903794314), (-8.607174435, -28.487496724))
            ThreePointArc((-8.607174435, -28.487496724), (-7.772195096, -35.84878124), (-13.652001323, -31.341722448))
            ThreePointArc((-13.652001323, -31.341722448), (-17.730481927, -31.171323009), (-21.314184336, -29.216811037))
            ThreePointArc((-21.314184336, -29.216811037), (-22.701556213, -31.247223745), (-25.01120364, -32.091560913))
            ThreePointArc((-25.01120364, -32.091560913), (-21.022595954, -36.403625004), (-15.746628746, -38.985689685))
            Line((-15.746628746, -38.985689685), (27.134926421, -50.877797421))
            ThreePointArc((27.134926421, -50.877797421), (39.2895174, -49.385401305), (46.82882769, -39.735524187))
            Line((46.82882769, -39.735524187), (52.028117024, -20.987492519))
            Line((52.028117024, -20.987492519), (52.028117024, 21.239305458))
            ThreePointArc((52.028117024, 21.239305458), (49.567566305, 20.392984288), (47.107015586, 21.239305458))
        make_face(mode=Mode.SUBTRACT)
        with BuildLine():
            ThreePointArc((-26.465118047, -17.984514757), (-27.31052728, -21.308508299), (-27.428073888, -24.736311186))
            ThreePointArc((-27.428073888, -24.736311186), (-25.8588989, -24.103781344), (-24.16841006, -24.171984149))
            ThreePointArc((-24.16841006, -24.171984149), (-23.998010621, -20.093503545), (-22.043498649, -16.509801136))
            ThreePointArc((-22.043498649, -16.509801136), (-23.527657447, -15.697596232), (-24.546925983, -14.34722747))
            ThreePointArc((-24.546925983, -14.34722747), (-25.623358962, -16.103991261), (-26.465118047, -17.984514757))
        make_face(mode=Mode.SUBTRACT)
    # profile 2 of 2: a face of its own
    with BuildSketch(Plane(origin=(0, 3.15, 0), x_dir=(1, 0, 0), z_dir=(0, 1, 0)).offset(BOSS_EXTRUDE2_START)):
        with Locations((35.265262251, -36.528663674)):
            Circle(SKETCH3_R_4)
        with Locations(Location((35.265262251, -36.528663674, 0), (0, 0, 270))):
            Circle(SKETCH3_R_2, mode=Mode.SUBTRACT)
    extrude(amount=BOSS_EXTRUDE2_DEPTH)


solid = part.part
